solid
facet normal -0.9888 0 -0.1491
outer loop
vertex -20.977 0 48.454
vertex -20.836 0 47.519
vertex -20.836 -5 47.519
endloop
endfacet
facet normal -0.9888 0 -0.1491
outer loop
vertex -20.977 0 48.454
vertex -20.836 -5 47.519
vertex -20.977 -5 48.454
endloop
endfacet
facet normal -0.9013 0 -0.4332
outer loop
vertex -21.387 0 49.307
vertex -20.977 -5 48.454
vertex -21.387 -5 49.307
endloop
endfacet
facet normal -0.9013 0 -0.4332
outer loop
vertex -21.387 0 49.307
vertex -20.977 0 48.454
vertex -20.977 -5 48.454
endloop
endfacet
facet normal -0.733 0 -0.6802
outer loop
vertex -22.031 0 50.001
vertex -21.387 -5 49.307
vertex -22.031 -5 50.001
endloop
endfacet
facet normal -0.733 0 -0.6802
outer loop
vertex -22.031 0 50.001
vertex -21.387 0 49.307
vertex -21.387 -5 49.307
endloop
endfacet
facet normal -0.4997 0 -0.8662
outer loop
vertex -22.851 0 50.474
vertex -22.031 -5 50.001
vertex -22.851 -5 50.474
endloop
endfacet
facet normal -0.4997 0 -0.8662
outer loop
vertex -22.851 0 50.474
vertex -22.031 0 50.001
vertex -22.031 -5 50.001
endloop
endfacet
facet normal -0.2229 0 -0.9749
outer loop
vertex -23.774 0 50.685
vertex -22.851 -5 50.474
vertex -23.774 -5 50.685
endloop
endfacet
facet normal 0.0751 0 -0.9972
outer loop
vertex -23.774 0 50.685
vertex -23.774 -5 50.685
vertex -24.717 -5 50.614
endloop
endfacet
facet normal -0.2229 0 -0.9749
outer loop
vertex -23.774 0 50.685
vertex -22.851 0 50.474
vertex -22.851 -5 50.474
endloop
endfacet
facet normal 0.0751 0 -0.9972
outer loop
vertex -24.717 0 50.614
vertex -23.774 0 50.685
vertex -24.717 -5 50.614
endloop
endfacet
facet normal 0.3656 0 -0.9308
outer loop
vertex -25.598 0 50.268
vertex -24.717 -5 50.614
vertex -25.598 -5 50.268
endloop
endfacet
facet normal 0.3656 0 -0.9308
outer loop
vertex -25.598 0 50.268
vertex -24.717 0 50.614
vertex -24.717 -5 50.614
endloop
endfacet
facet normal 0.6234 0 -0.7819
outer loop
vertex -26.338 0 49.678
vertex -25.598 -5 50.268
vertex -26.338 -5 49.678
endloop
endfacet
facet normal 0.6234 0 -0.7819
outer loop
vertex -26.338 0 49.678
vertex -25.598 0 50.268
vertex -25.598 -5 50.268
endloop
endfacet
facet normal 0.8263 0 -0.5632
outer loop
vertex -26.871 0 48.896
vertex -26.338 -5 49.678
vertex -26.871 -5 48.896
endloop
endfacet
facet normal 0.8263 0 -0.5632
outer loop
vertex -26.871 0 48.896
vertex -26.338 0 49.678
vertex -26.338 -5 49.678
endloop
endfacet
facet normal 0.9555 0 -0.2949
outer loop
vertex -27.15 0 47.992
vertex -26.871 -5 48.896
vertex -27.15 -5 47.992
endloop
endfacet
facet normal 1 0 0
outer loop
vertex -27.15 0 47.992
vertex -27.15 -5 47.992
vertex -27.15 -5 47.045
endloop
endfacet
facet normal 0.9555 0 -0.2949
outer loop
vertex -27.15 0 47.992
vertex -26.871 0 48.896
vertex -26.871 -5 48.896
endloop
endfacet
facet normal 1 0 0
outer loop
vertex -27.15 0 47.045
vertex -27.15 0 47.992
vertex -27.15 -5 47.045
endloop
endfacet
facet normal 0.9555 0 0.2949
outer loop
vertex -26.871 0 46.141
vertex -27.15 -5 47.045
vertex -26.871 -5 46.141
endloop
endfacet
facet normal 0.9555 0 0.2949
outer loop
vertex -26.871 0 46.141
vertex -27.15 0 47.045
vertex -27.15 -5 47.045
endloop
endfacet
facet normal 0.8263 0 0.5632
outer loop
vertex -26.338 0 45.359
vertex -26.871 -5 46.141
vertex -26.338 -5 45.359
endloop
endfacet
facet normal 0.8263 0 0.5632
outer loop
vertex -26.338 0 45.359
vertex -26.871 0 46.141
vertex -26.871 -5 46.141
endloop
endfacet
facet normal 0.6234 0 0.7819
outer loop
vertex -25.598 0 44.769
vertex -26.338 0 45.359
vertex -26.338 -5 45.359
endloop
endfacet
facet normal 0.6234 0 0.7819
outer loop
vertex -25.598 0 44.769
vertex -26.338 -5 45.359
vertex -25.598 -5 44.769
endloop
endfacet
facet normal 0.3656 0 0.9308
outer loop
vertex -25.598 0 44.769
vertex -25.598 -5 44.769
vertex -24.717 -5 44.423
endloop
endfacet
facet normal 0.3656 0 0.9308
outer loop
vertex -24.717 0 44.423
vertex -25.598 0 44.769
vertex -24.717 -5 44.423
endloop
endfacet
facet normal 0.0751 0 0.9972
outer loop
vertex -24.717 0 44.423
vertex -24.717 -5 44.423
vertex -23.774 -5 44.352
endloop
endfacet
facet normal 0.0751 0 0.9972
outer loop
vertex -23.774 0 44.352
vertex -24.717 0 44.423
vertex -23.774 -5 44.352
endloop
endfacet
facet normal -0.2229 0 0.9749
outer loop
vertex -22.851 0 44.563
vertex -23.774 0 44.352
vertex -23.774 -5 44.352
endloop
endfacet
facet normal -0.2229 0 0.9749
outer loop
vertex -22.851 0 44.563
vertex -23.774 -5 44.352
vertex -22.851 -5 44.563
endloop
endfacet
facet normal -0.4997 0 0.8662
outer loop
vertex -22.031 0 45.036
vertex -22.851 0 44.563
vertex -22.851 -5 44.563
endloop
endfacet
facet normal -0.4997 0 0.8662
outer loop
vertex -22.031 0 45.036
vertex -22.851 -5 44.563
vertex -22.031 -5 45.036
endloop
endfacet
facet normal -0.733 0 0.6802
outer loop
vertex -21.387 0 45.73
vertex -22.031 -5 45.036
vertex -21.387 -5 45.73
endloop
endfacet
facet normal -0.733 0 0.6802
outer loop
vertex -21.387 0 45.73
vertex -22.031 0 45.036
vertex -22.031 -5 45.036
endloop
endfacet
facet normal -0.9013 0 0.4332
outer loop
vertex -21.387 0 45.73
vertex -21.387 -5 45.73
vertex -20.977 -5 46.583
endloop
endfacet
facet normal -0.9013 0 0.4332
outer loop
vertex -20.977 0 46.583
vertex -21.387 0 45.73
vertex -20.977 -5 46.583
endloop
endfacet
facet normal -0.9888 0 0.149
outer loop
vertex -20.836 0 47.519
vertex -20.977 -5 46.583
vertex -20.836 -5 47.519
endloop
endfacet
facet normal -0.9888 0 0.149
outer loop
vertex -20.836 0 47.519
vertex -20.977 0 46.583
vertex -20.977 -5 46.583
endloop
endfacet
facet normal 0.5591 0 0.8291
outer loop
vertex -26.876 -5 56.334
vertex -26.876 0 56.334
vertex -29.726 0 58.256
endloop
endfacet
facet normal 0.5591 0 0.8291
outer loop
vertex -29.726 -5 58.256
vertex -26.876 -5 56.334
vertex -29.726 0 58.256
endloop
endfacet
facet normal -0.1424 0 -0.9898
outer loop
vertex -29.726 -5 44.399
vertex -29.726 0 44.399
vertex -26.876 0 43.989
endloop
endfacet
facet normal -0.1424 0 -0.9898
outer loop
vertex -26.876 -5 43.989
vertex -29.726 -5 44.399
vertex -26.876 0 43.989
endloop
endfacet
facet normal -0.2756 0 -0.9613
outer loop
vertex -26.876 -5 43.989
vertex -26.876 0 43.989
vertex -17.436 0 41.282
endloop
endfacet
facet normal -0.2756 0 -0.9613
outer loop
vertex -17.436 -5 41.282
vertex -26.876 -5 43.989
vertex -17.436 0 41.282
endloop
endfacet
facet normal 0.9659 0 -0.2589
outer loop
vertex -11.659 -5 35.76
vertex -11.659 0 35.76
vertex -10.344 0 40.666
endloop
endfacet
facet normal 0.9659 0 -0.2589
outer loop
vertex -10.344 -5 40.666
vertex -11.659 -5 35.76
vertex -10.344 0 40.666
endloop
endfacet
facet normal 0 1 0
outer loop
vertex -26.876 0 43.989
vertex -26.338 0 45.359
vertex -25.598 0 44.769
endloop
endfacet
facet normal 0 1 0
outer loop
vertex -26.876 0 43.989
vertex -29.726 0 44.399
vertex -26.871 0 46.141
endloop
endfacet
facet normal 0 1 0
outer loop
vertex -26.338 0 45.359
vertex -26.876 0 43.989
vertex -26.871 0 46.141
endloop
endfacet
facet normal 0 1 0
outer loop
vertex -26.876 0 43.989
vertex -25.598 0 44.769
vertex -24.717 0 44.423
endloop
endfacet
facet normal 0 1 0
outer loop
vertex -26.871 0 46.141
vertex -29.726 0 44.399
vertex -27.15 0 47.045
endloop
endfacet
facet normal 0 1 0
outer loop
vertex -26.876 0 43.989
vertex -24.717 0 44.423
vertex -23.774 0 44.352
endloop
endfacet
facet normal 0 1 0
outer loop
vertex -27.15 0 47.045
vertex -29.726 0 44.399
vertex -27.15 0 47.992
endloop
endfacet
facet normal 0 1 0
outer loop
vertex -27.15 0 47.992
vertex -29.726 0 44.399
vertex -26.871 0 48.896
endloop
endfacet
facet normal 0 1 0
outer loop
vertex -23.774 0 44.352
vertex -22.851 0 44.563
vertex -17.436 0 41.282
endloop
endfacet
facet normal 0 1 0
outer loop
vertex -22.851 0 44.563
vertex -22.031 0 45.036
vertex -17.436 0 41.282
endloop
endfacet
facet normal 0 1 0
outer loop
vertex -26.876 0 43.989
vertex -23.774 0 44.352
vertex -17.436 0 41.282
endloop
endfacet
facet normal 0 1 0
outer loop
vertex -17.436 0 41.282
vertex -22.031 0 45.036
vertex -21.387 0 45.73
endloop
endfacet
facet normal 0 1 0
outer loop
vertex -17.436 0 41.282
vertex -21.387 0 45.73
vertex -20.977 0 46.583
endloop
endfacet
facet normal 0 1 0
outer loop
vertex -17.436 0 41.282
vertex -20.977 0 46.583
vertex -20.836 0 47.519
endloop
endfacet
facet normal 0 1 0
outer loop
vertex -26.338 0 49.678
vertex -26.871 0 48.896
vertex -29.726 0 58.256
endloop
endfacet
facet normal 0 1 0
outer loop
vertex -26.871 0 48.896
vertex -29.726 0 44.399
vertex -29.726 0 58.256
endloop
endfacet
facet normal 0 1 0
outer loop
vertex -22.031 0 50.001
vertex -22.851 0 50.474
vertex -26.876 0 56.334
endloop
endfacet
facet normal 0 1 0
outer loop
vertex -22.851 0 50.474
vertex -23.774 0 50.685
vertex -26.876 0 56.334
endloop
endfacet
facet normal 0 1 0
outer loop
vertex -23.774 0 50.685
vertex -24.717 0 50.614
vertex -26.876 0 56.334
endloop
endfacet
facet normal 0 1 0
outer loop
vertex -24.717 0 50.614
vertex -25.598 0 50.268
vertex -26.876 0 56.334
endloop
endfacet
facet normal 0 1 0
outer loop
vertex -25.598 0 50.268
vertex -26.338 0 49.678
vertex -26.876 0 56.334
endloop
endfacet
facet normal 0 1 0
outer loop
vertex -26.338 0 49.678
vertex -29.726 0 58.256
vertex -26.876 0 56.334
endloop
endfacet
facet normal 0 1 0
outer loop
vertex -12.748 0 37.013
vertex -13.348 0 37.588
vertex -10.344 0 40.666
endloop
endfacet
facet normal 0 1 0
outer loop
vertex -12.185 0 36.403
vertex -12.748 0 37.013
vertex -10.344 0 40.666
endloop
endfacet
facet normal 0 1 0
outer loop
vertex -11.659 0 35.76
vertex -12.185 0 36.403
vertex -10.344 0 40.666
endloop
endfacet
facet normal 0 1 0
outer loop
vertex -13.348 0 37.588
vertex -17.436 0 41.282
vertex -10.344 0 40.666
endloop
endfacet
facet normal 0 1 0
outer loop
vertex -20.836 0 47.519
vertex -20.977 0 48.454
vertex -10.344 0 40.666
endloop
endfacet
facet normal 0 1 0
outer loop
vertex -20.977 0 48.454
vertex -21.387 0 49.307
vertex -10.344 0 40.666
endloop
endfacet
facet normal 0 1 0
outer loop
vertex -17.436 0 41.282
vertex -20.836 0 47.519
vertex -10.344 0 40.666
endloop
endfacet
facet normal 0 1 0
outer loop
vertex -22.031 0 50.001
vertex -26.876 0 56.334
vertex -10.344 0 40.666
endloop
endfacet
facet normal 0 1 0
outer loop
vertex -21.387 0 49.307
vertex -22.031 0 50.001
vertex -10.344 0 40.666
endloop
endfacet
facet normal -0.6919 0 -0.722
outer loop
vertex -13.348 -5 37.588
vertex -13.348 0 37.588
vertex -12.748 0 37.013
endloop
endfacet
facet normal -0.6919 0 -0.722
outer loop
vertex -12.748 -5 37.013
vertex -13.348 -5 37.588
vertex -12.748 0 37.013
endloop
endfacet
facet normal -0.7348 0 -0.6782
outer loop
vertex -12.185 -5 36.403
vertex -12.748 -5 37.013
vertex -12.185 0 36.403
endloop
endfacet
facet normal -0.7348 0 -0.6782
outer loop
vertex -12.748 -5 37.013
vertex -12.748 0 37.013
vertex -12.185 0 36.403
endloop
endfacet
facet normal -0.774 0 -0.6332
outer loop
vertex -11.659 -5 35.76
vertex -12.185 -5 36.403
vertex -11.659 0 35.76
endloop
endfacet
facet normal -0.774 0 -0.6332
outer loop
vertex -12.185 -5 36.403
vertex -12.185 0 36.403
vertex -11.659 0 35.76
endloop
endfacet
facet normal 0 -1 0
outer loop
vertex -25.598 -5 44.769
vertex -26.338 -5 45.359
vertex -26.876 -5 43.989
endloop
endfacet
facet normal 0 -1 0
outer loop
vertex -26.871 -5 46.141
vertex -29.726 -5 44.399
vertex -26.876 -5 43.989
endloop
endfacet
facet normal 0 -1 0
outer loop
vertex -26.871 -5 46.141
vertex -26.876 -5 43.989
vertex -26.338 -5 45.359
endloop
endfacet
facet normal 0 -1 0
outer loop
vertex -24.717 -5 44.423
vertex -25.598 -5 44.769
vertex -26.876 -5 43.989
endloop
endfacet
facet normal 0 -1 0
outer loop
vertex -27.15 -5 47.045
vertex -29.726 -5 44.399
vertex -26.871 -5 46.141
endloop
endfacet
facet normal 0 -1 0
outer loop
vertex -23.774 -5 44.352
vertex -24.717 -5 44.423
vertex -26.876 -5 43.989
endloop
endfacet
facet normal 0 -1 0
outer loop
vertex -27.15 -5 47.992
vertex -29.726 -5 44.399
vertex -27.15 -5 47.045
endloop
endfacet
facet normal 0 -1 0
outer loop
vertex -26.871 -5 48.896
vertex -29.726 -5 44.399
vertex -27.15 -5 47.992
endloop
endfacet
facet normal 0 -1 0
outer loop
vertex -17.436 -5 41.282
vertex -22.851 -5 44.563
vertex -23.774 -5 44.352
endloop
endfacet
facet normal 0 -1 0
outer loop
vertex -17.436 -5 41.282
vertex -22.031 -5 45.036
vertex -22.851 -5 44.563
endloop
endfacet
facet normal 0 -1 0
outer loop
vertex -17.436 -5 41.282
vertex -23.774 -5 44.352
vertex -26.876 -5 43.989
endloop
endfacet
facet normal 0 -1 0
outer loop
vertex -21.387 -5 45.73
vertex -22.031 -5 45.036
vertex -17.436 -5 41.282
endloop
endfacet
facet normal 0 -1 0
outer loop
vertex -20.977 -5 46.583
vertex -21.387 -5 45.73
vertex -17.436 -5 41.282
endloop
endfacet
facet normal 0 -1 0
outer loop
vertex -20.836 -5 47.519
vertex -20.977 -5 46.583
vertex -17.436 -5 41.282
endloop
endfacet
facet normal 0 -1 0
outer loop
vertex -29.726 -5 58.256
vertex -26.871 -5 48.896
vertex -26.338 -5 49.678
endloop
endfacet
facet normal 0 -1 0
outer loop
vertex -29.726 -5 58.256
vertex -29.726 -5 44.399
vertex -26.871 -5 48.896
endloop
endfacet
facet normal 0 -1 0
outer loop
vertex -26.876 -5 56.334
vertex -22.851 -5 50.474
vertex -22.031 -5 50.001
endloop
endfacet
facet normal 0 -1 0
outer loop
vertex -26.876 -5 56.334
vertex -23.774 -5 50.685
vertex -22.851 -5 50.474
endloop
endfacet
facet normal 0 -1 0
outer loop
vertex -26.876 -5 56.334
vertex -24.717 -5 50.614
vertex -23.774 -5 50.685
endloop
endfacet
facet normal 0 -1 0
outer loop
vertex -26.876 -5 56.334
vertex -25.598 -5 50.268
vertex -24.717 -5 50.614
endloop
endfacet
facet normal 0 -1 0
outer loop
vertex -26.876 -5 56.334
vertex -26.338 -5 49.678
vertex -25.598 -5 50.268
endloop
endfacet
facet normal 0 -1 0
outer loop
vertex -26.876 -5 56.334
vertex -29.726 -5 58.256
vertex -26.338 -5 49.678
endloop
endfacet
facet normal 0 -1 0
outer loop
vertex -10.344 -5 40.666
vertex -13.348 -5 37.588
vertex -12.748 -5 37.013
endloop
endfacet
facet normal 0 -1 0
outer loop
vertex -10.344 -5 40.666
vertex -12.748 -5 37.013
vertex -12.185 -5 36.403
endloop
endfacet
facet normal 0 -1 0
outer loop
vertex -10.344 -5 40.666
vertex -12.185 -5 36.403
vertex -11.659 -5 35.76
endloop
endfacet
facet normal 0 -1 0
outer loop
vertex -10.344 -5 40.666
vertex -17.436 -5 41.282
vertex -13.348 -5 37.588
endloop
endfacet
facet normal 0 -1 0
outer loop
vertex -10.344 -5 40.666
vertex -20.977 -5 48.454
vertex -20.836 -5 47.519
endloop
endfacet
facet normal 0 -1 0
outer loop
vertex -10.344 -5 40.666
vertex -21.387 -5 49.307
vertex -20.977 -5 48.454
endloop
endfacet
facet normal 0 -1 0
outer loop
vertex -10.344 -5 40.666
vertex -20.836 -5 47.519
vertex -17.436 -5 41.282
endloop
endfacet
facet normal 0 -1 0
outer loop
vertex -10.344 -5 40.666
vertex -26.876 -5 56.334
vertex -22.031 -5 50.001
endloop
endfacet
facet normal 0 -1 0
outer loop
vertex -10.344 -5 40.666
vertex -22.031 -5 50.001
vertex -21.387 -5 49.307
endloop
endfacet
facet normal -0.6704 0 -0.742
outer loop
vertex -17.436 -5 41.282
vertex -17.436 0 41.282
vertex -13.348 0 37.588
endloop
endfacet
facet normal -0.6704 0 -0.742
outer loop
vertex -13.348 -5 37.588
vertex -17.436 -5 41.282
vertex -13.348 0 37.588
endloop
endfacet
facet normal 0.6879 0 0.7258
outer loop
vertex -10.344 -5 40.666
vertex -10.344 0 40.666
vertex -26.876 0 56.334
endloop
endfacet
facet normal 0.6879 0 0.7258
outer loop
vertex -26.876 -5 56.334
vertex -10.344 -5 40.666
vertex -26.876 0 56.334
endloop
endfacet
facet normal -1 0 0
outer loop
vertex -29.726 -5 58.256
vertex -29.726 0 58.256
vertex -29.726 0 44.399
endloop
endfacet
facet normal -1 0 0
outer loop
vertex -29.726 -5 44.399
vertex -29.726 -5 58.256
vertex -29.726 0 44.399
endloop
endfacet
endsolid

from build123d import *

# Parameters (mm, degrees)
F0_R     = 3.175
F1_DEPTH = 5


with BuildPart() as f1:
    # F0 (on Front) → F1 (new body)
    with BuildSketch(Plane.XZ):
        with BuildLine():
            ThreePointArc((-13.347524, 37.588448), (-12.461887, 36.712299), (-11.659195, 35.759579))
            Line((-11.659195, 35.759579), (-10.344394, 40.666482))
            Line((-10.344394, 40.666482), (-26.876474, 56.333769))
            Line((-26.876474, 56.333769), (-29.725796, 58.255821))
            Line((-29.725796, 58.255821), (-29.725796, 44.399414))
            Line((-29.725796, 44.399414), (-26.876474, 43.988798))
            Line((-26.876474, 43.988798), (-17.436201, 41.282147))
            Line((-17.436201, 41.282147), (-13.347524, 37.588448))
        make_face()
        with Locations((-24.010796, 47.518508)):
            Circle(F0_R, mode=Mode.SUBTRACT)
    extrude(amount=F1_DEPTH)


solid = f1.part
